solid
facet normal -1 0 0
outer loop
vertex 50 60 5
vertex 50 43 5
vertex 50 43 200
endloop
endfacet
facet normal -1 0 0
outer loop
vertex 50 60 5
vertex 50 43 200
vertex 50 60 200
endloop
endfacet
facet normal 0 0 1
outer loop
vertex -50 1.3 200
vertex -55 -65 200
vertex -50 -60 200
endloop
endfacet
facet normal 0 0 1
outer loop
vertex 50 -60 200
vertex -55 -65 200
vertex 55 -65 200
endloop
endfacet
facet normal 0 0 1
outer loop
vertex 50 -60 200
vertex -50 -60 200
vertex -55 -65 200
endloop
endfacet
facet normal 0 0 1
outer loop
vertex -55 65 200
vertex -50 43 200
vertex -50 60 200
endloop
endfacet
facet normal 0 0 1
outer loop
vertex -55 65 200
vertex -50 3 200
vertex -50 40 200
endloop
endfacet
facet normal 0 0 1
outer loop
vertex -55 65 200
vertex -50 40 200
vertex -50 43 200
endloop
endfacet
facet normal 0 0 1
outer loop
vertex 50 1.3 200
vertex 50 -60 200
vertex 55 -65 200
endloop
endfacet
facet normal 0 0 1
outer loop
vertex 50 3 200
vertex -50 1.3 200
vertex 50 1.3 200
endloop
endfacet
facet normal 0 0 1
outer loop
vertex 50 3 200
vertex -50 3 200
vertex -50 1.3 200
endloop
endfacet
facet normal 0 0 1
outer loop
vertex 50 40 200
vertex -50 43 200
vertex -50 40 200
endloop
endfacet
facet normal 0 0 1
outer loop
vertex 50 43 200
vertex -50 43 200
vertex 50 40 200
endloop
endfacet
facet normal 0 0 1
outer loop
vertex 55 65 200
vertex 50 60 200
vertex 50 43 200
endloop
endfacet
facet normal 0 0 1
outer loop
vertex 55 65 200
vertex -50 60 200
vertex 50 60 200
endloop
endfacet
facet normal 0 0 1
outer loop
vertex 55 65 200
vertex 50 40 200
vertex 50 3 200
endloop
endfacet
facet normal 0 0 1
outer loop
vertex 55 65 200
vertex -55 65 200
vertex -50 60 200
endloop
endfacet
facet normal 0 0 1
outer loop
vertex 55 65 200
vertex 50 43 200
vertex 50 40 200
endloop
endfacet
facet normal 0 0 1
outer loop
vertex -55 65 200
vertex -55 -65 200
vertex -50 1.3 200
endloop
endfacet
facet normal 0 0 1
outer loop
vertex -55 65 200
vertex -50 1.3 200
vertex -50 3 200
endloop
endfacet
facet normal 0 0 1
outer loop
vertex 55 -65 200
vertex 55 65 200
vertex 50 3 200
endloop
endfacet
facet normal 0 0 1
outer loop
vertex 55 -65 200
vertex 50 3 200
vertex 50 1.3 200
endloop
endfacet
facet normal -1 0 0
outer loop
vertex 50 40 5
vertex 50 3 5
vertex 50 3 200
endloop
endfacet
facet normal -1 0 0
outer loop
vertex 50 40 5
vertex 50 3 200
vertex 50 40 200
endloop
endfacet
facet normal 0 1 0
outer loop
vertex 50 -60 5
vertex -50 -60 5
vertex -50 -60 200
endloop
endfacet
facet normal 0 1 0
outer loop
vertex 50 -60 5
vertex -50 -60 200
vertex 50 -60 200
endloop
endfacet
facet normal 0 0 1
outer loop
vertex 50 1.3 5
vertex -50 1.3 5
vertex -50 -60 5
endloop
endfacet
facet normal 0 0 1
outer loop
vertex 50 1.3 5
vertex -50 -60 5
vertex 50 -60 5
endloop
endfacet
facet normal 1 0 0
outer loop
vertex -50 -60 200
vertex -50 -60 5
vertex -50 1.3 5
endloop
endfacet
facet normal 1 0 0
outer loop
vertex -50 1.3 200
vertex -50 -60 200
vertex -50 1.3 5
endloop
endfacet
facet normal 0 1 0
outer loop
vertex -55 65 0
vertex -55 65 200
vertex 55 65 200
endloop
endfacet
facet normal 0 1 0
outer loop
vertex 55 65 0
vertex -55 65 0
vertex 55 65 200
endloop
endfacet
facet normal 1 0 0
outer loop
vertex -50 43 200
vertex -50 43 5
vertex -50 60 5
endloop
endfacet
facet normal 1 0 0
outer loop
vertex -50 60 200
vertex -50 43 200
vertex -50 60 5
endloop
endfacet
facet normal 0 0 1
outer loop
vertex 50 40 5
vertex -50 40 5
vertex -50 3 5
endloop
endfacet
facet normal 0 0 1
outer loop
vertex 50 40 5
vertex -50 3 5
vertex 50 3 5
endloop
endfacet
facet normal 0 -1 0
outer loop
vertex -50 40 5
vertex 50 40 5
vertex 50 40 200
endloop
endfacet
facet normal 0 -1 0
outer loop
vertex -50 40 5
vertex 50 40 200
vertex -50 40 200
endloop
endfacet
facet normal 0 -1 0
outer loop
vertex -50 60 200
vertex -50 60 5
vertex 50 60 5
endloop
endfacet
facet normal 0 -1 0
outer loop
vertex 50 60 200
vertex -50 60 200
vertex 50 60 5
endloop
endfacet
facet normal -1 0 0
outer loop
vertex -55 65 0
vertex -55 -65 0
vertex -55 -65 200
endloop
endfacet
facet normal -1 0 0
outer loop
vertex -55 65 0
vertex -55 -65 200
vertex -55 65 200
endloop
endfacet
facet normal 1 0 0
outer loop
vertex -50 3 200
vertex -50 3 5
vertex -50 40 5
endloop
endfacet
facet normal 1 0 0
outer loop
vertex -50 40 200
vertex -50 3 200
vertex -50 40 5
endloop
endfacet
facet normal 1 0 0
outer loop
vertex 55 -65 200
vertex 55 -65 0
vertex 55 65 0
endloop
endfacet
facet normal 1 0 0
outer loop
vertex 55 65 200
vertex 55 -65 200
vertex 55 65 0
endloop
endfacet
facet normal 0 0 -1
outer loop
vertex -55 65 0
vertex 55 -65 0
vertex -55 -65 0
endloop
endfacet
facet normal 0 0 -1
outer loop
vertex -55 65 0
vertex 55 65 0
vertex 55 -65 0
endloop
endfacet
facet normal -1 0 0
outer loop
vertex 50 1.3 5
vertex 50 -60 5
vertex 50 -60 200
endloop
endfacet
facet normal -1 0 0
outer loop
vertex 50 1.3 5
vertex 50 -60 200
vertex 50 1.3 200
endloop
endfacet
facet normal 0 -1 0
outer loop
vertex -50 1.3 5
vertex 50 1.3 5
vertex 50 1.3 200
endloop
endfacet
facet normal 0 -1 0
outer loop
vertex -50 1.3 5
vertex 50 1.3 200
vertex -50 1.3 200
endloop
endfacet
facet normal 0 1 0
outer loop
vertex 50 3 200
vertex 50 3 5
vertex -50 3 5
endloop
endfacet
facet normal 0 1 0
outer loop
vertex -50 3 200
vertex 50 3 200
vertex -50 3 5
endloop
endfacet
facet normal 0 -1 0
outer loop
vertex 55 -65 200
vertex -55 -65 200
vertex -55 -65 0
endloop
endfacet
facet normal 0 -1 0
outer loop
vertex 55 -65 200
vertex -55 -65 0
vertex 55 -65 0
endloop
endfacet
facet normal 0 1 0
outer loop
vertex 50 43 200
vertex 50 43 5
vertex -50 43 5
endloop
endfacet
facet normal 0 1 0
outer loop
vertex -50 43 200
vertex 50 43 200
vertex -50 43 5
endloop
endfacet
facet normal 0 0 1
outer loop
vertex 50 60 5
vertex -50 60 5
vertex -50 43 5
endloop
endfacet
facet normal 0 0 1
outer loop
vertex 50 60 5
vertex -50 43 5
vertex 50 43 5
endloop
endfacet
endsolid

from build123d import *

# Parameters (mm, degrees)
SKETCH1_W           = 110
SKETCH1_H           = 130
BOSS_EXTRUDE1_DEPTH = 200
SHELL1_T            = -5
SKETCH2_W           = 110
SKETCH2_H           = 1.7
BOSS_EXTRUDE2_DEPTH = 200
SKETCH5_W           = 110
SKETCH5_H           = 3
BOSS_EXTRUDE3_DEPTH = 200


with BuildPart() as part:
    # Sketch1 → Boss-Extrude1 (new body)
    with BuildSketch(Plane.XY):
        Rectangle(SKETCH1_W, SKETCH1_H)
    extrude(amount=BOSS_EXTRUDE1_DEPTH)

    # Shell1
    shell1_openings = [part.faces().sort_by_distance(p)[0] for p in [
        (0, 0, 200),
    ]]
    offset(amount=SHELL1_T, openings=shell1_openings, kind=Kind.INTERSECTION)

    # Sketch2 → Boss-Extrude2 (add)
    with BuildSketch(Plane(origin=(0, 0, 0), x_dir=(-1, 0, 0), z_dir=(0, 0, -1))):
        with Locations((0, 2.15)):
            Rectangle(SKETCH2_W, SKETCH2_H)
    extrude(amount=-BOSS_EXTRUDE2_DEPTH)

    # Sketch5 → Boss-Extrude3 (add)
    with BuildSketch(Plane(origin=(0, 0, 0), x_dir=(-1, 0, 0), z_dir=(0, 0, -1))):
        with Locations((0, 41.5)):
            Rectangle(SKETCH5_W, SKETCH5_H)
    extrude(amount=-BOSS_EXTRUDE3_DEPTH)


solid = part.part
